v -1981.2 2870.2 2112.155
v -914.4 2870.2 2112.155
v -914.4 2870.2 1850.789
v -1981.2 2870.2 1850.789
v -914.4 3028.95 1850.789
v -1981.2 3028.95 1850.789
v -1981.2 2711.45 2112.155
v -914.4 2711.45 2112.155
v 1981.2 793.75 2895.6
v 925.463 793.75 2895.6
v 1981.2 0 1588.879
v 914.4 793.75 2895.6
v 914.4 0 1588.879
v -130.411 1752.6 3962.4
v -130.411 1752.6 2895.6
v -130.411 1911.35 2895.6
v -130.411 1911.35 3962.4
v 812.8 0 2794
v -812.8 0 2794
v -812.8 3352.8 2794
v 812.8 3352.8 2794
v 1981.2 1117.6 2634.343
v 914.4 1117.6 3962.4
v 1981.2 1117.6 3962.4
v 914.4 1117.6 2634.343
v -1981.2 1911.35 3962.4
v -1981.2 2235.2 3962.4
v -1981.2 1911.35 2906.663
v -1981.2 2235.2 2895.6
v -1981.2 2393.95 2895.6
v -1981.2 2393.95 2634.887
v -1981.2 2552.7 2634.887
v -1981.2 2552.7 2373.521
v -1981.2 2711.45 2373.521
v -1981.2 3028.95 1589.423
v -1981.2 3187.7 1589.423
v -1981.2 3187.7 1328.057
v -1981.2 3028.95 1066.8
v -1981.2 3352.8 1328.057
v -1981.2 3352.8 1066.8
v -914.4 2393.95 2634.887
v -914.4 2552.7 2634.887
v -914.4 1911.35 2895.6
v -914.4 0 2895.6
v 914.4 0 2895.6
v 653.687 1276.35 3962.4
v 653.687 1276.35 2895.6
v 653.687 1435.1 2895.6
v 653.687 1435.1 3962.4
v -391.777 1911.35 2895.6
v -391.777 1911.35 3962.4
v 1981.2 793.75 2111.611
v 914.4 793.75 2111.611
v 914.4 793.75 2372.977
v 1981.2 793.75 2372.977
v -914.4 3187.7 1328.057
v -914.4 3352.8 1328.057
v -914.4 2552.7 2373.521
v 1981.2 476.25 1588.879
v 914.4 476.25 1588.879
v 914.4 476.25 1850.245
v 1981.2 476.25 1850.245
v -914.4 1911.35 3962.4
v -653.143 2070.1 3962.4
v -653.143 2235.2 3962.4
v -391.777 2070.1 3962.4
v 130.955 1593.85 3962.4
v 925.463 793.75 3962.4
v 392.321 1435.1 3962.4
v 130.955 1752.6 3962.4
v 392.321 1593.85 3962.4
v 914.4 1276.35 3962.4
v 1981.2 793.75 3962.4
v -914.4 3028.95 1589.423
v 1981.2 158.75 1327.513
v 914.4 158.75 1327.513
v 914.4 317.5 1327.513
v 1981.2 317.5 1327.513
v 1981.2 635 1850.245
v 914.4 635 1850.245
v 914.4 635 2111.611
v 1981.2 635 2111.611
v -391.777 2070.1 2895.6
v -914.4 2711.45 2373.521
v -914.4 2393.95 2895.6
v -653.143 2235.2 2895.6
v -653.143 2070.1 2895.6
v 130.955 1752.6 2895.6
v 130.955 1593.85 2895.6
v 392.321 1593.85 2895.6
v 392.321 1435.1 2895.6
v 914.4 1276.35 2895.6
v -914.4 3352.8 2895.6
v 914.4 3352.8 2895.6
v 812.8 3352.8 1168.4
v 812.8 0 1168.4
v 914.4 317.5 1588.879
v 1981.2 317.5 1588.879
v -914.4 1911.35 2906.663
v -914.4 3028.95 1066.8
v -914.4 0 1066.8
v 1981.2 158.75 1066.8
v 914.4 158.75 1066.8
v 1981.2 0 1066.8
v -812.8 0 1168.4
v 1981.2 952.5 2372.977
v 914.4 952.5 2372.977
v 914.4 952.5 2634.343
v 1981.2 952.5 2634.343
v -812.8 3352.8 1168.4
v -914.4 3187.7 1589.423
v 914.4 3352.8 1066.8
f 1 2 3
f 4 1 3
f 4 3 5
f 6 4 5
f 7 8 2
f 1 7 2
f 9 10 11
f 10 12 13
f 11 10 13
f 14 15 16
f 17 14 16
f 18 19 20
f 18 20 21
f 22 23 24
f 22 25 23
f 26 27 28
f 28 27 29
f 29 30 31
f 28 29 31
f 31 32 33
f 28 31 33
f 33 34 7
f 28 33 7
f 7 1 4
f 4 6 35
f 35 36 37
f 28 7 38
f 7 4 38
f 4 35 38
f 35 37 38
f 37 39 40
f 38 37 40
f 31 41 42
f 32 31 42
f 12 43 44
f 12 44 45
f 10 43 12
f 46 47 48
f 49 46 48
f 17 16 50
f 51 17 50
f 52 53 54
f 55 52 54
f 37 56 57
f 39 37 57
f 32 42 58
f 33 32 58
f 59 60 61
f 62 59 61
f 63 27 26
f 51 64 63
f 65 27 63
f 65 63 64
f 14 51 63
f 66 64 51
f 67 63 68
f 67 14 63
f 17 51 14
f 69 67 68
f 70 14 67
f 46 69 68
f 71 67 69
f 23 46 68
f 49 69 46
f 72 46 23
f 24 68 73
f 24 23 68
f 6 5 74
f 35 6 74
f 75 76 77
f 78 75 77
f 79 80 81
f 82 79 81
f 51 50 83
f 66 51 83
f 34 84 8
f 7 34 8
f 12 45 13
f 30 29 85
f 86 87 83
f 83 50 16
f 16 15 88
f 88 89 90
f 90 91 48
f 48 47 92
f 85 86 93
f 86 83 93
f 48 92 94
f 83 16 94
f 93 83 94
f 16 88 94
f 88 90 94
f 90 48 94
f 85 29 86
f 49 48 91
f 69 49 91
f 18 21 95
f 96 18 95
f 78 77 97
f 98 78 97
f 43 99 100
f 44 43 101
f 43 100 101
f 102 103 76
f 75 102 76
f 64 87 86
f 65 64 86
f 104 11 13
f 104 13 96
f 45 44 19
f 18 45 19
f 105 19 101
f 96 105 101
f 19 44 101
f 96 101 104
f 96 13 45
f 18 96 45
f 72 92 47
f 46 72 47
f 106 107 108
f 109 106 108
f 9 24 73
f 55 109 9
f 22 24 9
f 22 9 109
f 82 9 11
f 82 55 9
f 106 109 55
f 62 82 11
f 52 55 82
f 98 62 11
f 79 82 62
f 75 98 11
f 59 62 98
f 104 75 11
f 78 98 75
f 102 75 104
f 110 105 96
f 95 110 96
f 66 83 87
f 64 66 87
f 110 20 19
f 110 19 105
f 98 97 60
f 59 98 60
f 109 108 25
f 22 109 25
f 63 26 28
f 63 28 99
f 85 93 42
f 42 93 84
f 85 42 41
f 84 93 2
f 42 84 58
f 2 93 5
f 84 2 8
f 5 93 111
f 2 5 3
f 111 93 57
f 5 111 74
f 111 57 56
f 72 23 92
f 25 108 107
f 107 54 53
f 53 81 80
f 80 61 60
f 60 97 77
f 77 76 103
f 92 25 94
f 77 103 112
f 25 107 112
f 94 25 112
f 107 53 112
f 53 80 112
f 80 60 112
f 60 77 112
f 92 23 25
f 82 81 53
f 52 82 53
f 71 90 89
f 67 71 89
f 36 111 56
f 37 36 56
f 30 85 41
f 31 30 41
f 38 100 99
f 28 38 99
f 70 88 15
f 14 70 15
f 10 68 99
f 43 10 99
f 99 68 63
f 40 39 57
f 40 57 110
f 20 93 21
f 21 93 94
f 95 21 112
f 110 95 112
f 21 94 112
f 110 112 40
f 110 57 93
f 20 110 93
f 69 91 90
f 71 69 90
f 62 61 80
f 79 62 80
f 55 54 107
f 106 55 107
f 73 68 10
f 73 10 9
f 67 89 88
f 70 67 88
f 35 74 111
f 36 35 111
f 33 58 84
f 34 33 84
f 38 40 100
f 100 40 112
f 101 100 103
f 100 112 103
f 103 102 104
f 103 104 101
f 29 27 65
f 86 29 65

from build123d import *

# Parameters (mm, degrees)
SKETCH1_W           = 1828.8
SKETCH1_H           = 1752.6
SKETCH1_W_2         = 1625.6
SKETCH1_H_2         = 1625.6
SKETCH1_H_3         = 76.2
BOSS_EXTRUDE1_DEPTH = 3352.8
BOSS_EXTRUDE2_DEPTH = 1066.8
BOSS_EXTRUDE3_DEPTH = 1066.8
SKETCH5_W           = 1066.8
SKETCH5_H           = 1066.8
SKETCH5_W_2         = 522.078857143
BOSS_EXTRUDE5_DEPTH = 323.85
BOSS_EXTRUDE6_DEPTH = 1066.8
SKETCH7_W           = 1066.8
SKETCH7_H           = 1066.8
SKETCH7_H_2         = 522.078857143
BOSS_EXTRUDE7_DEPTH = 323.85
CUT_EXTRUDE1_DEPTH  = 1066.8
CUT_EXTRUDE2_DEPTH  = 1066.8


with BuildPart() as part:
    # Sketch1 → Boss-Extrude1 (new body)
    # profile 1 of 2: a face of its own
    with BuildSketch(Plane(origin=(0, 0, 0), x_dir=(1, 0, 0), z_dir=(0, 1, 0))):
        with Locations((0, -1943.1)):
            Rectangle(SKETCH1_W, SKETCH1_H)
        with Locations((0, -1981.2)):
            Rectangle(SKETCH1_W_2, SKETCH1_H_2, mode=Mode.SUBTRACT)
    # profile 2 of 2: a face of its own
    with BuildSketch(Plane(origin=(0, 0, 0), x_dir=(1, 0, 0), z_dir=(0, 1, 0))):
        with Locations((0, -2857.5)):
            Rectangle(SKETCH1_W, SKETCH1_H_3)
    extrude(amount=BOSS_EXTRUDE1_DEPTH)

    # Sketch3 → Boss-Extrude2 (add)
    with BuildSketch(Plane(origin=(914.4, 0, 0), x_dir=(0, 0, -1), z_dir=(1, 0, 0))):
        Polygon((-1588.878857143, 0), (-1066.8, 0), (-1066.8, 158.75), (-1327.512857143, 158.75), (-1327.512857143, 317.5), (-1588.878857143, 317.5), (-1588.878857143, 476.25), (-1850.244857143, 476.25), (-1850.244857143, 635), (-2111.610857143, 635), (-2111.610857143, 793.75), (-2372.976857143, 793.75), (-2372.976857143, 952.5), (-2634.342857143, 952.5), (-2634.342857143, 1117.6), (-2895.6, 1117.6), (-2895.6, 793.75), align=None)
    extrude(amount=BOSS_EXTRUDE2_DEPTH)

    # Sketch4 → Boss-Extrude3 (add)
    with BuildSketch(Plane.XY.offset(2895.6)):
        Polygon((392.321142857, 1117.6), (914.4, 1117.6), (914.4, 1276.35), (653.687142857, 1276.35), (653.687142857, 1435.1), (392.321142857, 1435.1), (392.321142857, 1593.85), (130.955142857, 1593.85), (130.955142857, 1752.6), (-130.410857143, 1752.6), (-130.410857143, 1911.35), (-391.776857143, 1911.35), (-391.776857143, 2070.1), (-653.142857143, 2070.1), (-653.142857143, 2235.2), (-914.4, 2235.2), (-914.4, 1911.35), align=None)
    extrude(amount=BOSS_EXTRUDE3_DEPTH)

    # Sketch5 → Boss-Extrude5 (add)
    with BuildSketch(Plane(origin=(0, 1117.6, 0), x_dir=(1, 0, 0), z_dir=(0, 1, 0))):
        with Locations((1447.8, -3429)):
            Rectangle(SKETCH5_W, SKETCH5_H)
        with Locations((653.360571429, -3429)):
            Rectangle(SKETCH5_W_2, SKETCH5_H)
    extrude(amount=-BOSS_EXTRUDE5_DEPTH)

    # Sketch6 → Boss-Extrude6 (add)
    with BuildSketch(Plane.ZY.offset(914.4)):
        Polygon((2373.521142857, 2235.2), (2895.6, 2235.2), (2895.6, 2393.95), (2634.887142857, 2393.95), (2634.887142857, 2552.7), (2373.521142857, 2552.7), (2373.521142857, 2711.45), (2112.155142857, 2711.45), (2112.155142857, 2870.2), (1850.789142857, 2870.2), (1850.789142857, 3028.95), (1589.423142857, 3028.95), (1589.423142857, 3187.7), (1328.057142857, 3187.7), (1328.057142857, 3352.8), (1066.8, 3352.8), (1066.8, 3028.95), align=None)
    extrude(amount=BOSS_EXTRUDE6_DEPTH)

    # Sketch7 → Boss-Extrude7 (add)
    with BuildSketch(Plane.XZ.offset(-2235.2)):
        with Locations((-1447.8, 3429)):
            Rectangle(SKETCH7_W, SKETCH7_H)
        with Locations((-1447.8, 2634.560571429)):
            Rectangle(SKETCH7_W, SKETCH7_H_2)
    extrude(amount=BOSS_EXTRUDE7_DEPTH)

    # Sketch8 → Cut-Extrude1 (cut)
    with BuildSketch(Plane.XY.offset(3962.4)):
        Polygon((925.463369143, 793.75), (392.321142857, 1117.6), (392.321142857, 793.75), align=None)
    extrude(amount=-CUT_EXTRUDE1_DEPTH, mode=Mode.SUBTRACT)

    # Sketch9 → Cut-Extrude2 (cut)
    with BuildSketch(Plane.ZY.offset(1981.2)):
        Polygon((2906.663369143, 1911.35), (2373.521142857, 2235.2), (2373.521142857, 1911.35), align=None)
    extrude(amount=-CUT_EXTRUDE2_DEPTH, mode=Mode.SUBTRACT)


solid = part.part
